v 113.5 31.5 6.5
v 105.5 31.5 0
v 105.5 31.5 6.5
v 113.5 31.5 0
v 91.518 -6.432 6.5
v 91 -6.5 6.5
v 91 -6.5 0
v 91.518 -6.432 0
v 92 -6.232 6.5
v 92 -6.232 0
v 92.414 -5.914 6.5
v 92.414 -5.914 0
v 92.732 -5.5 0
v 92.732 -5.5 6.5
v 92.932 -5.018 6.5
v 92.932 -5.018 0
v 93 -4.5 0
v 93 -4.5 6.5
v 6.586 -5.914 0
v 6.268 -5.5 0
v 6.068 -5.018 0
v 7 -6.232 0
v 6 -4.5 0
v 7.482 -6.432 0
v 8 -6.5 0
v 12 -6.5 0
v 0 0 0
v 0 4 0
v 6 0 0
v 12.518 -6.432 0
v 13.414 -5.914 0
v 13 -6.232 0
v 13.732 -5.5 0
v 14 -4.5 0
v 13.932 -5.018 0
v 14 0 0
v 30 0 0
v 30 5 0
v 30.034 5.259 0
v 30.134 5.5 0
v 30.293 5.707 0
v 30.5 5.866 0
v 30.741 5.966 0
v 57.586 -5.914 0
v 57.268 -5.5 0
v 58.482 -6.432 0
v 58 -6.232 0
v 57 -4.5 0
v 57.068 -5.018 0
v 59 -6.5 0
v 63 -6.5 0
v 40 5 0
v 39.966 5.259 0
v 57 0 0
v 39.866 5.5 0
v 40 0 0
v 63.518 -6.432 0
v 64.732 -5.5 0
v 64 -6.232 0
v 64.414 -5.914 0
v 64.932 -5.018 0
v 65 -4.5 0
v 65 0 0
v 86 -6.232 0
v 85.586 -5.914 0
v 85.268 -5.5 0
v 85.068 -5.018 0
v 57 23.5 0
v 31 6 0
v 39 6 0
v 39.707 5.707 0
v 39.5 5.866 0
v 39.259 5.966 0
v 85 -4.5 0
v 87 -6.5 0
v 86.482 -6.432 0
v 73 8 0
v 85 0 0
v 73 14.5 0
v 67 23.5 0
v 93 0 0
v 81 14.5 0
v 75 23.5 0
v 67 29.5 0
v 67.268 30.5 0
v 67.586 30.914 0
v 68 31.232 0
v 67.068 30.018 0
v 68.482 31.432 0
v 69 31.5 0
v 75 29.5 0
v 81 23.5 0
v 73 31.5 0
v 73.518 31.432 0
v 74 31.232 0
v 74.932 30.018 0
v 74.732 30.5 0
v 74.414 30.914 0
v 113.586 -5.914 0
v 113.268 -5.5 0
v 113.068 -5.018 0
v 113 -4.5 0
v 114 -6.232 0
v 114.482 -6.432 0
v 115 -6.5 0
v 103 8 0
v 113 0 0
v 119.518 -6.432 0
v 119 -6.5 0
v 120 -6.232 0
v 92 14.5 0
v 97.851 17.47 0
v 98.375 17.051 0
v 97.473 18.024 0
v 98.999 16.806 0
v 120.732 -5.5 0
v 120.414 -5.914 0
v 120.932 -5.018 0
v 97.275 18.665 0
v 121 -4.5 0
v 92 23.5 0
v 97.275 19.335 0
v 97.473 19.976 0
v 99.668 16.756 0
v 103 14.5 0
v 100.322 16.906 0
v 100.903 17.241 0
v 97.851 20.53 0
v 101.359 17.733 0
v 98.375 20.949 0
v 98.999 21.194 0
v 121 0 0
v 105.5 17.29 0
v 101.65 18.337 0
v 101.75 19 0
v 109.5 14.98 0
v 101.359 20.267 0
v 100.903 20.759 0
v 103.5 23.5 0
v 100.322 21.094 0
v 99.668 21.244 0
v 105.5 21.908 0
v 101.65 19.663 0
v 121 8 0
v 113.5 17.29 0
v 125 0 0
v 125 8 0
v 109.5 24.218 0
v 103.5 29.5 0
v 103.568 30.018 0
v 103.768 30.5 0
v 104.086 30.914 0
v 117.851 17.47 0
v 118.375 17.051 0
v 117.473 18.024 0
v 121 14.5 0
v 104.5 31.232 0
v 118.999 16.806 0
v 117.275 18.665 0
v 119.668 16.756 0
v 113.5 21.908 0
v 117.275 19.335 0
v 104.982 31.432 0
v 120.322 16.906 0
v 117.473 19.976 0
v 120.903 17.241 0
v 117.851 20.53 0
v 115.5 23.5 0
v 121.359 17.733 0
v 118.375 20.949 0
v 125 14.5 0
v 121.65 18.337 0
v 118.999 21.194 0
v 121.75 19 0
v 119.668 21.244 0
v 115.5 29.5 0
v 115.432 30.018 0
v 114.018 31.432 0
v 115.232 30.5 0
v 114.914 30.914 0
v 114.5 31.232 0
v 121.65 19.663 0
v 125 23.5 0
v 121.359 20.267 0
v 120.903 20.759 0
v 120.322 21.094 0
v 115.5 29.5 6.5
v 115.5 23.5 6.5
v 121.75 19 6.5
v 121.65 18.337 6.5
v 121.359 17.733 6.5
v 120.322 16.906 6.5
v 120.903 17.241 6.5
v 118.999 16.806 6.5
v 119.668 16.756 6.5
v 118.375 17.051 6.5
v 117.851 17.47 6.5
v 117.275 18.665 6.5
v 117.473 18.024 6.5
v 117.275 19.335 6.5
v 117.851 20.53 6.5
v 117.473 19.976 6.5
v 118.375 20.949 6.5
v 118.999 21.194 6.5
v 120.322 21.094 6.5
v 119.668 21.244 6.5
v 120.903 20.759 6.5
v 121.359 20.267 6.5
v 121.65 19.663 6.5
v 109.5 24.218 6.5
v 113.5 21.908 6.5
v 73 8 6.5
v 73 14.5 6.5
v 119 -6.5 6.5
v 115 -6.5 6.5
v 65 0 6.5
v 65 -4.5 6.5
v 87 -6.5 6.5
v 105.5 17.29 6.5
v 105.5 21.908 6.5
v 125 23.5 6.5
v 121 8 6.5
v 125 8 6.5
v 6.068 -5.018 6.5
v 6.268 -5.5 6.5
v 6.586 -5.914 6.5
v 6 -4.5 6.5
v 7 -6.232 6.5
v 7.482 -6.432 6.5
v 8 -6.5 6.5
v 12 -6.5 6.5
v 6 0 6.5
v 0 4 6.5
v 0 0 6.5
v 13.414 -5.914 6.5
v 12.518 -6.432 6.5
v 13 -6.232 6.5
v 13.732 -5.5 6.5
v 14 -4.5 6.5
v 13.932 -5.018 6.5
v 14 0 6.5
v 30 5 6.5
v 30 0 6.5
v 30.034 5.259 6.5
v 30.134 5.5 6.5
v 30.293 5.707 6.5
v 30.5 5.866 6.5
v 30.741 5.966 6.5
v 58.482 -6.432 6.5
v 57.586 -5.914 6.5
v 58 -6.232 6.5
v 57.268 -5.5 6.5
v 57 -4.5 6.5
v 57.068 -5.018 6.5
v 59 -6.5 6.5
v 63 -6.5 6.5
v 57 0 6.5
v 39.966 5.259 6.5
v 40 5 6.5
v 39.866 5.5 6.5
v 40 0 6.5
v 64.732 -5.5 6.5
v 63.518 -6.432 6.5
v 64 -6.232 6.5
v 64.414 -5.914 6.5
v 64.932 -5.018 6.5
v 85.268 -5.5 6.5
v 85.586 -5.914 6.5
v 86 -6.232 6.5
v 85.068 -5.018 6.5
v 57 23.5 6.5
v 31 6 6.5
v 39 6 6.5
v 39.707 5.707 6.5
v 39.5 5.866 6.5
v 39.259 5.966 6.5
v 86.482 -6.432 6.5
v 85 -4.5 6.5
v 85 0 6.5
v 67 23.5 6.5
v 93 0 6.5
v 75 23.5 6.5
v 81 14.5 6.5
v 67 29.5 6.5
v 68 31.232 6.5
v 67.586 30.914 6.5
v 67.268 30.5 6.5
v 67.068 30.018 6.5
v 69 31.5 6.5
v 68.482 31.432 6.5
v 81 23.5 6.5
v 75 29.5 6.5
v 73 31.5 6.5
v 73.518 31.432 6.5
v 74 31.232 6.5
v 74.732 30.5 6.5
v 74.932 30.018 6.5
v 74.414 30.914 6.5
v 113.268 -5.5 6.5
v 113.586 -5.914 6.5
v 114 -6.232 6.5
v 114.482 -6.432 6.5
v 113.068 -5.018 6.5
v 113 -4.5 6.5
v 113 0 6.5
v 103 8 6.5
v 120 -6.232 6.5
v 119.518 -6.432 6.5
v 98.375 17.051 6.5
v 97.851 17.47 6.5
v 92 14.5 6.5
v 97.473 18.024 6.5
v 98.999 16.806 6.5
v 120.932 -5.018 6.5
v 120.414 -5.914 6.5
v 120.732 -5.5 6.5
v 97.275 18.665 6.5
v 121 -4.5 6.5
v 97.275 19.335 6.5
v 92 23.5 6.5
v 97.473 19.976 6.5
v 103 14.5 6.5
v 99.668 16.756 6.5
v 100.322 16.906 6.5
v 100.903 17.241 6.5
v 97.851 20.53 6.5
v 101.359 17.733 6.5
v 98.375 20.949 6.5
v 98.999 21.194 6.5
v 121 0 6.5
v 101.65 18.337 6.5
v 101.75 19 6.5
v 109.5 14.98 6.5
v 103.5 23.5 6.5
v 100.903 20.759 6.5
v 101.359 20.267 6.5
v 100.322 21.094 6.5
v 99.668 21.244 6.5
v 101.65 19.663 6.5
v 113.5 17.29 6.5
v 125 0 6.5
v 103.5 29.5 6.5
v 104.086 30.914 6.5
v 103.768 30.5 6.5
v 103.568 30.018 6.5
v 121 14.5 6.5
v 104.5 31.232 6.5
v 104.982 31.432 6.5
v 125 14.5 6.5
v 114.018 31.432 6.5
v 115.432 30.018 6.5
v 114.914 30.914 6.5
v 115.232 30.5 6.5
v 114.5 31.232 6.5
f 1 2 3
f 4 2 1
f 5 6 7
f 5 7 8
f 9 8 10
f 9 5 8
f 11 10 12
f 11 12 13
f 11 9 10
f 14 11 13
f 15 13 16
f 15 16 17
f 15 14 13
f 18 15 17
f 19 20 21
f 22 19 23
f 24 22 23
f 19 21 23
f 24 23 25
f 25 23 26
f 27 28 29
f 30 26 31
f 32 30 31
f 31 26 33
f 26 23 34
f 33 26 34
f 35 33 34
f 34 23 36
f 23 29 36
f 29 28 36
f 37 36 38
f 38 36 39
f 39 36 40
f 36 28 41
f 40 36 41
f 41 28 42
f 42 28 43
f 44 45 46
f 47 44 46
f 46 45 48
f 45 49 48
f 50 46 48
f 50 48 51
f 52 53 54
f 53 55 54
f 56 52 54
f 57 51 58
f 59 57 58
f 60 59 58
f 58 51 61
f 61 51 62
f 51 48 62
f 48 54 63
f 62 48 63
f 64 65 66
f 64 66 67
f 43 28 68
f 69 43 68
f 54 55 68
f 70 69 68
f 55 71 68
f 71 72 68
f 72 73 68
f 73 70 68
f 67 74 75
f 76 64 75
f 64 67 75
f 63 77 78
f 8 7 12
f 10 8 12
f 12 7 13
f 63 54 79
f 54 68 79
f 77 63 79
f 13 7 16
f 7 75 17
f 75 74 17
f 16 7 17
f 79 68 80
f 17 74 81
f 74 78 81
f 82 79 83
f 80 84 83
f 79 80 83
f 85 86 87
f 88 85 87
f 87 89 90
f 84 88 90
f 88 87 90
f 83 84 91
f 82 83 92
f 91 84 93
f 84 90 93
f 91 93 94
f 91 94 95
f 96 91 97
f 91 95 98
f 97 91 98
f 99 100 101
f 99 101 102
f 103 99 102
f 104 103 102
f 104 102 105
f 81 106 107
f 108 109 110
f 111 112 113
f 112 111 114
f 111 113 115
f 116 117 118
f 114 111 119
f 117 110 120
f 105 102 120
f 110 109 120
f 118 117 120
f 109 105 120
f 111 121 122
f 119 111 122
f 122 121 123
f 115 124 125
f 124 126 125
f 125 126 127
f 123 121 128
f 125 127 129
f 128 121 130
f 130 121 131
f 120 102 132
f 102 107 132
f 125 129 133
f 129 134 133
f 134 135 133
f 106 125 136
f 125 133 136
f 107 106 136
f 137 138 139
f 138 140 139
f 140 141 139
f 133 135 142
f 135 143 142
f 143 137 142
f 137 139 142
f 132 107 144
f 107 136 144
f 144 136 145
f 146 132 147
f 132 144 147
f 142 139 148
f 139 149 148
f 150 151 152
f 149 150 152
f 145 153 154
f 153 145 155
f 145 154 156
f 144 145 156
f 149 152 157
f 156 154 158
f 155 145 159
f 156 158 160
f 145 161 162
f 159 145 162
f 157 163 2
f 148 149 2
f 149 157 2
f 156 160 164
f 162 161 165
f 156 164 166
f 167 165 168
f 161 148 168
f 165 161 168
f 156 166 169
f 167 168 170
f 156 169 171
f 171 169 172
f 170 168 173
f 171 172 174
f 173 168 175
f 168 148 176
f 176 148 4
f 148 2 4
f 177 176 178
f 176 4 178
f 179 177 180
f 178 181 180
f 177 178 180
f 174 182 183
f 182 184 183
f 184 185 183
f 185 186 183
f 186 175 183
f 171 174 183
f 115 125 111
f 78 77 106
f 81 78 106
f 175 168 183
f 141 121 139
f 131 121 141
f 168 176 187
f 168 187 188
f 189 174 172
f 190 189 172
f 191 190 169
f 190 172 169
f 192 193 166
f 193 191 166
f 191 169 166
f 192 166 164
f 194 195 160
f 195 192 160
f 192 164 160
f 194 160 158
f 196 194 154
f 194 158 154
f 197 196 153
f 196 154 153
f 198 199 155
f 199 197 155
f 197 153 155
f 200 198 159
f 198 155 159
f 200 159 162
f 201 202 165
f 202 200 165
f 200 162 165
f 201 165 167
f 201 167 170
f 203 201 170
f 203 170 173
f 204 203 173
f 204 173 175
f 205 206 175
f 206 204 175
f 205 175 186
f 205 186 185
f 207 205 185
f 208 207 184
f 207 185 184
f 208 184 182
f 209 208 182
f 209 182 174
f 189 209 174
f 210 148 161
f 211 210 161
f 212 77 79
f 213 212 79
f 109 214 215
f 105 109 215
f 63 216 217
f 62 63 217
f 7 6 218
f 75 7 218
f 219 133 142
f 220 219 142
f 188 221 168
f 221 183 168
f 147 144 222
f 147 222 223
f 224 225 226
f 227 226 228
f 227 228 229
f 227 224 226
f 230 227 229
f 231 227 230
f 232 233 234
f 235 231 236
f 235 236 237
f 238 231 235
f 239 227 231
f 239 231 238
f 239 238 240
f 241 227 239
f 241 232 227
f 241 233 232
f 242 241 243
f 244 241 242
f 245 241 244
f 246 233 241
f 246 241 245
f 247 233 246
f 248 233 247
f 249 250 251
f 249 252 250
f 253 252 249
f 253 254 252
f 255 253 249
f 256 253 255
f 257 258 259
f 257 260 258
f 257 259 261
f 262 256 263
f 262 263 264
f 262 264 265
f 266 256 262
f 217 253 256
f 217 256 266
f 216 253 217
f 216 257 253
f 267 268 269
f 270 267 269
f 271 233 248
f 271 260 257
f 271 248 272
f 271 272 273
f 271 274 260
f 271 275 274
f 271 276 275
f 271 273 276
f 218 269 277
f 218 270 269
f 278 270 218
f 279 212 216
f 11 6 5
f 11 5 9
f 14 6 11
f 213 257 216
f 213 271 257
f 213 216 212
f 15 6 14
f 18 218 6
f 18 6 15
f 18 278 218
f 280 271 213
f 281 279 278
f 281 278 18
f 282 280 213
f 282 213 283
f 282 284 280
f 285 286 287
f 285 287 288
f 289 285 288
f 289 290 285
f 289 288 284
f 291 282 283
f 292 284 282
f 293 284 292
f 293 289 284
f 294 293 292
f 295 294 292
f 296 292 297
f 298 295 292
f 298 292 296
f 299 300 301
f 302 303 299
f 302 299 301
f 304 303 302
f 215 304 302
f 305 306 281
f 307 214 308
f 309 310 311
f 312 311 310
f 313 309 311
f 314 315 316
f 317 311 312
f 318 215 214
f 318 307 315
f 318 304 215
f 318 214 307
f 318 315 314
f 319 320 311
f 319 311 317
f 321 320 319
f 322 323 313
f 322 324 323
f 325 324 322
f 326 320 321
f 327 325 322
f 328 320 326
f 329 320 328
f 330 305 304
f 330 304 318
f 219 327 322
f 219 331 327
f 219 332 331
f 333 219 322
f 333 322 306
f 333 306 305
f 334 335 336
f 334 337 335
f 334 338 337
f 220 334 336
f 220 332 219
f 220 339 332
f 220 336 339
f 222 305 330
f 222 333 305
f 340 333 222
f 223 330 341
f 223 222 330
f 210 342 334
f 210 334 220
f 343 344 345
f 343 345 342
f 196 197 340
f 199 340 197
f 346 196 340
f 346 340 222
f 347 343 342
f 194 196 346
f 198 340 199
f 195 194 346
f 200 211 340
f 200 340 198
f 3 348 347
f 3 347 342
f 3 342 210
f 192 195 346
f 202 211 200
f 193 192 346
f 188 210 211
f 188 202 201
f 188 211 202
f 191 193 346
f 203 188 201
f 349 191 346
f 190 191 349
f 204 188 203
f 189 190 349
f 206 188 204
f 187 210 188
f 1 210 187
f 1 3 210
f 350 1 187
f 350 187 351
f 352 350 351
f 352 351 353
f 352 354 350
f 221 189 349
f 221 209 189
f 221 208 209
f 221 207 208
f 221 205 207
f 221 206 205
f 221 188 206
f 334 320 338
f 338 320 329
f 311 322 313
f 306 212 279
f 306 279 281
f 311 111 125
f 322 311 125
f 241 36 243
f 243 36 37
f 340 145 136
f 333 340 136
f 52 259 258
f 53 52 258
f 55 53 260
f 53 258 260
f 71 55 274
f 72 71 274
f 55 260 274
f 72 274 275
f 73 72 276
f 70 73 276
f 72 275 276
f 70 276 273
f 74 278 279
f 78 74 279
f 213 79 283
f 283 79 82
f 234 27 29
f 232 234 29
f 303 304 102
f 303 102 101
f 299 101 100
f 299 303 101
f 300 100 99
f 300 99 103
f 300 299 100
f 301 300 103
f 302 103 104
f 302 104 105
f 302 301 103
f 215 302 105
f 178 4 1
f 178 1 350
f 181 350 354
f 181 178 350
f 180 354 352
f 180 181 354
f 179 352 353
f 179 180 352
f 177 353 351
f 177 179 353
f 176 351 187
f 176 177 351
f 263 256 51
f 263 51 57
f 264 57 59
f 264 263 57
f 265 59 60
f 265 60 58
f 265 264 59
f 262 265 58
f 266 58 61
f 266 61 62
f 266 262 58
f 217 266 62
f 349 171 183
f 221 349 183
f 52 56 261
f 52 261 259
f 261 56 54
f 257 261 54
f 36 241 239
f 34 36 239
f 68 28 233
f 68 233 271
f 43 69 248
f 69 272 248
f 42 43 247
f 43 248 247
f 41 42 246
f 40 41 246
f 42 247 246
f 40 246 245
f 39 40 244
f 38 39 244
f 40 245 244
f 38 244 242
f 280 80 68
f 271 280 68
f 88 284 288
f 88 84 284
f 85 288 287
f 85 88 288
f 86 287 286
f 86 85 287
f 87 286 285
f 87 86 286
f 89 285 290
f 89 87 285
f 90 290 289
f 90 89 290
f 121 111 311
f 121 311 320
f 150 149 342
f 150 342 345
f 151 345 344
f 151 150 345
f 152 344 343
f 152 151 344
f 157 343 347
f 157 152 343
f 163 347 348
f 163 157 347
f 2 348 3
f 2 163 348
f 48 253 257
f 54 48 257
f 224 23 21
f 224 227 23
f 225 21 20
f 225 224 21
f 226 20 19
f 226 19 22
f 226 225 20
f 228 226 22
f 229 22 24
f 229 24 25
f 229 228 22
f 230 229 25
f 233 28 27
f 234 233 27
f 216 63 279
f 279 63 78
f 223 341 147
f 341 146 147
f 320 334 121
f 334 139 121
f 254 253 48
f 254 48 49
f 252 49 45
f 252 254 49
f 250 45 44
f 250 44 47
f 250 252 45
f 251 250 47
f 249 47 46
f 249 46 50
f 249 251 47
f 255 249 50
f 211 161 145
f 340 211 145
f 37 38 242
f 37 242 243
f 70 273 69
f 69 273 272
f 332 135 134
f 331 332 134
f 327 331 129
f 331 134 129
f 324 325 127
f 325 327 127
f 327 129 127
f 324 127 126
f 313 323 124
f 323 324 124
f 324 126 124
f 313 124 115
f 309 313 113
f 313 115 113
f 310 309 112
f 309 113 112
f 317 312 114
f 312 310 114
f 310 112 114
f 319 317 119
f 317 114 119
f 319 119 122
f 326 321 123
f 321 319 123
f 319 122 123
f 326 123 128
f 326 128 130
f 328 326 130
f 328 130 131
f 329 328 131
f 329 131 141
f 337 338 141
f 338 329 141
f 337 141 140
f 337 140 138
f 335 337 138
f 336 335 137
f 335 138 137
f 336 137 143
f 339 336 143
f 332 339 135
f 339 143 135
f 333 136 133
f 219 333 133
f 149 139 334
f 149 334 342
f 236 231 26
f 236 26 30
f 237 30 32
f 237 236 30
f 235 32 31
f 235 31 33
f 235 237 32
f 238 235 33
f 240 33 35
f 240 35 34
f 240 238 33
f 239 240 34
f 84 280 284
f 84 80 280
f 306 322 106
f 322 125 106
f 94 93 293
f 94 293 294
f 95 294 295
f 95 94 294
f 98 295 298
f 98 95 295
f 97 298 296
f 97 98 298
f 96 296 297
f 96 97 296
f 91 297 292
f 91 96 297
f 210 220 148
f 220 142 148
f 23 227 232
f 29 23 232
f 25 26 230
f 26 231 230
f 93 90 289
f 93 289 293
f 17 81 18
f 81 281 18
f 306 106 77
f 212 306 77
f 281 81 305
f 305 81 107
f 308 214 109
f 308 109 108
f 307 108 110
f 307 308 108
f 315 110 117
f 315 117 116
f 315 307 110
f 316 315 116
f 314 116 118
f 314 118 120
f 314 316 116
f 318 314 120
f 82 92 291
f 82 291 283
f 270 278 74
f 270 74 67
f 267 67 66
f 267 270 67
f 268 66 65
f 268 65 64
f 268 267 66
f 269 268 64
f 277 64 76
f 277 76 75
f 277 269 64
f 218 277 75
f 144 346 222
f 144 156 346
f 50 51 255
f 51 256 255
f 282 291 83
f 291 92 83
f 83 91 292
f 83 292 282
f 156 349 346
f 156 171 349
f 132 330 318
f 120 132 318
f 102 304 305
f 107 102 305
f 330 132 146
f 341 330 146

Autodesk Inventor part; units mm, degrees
ref_plane "YZ Plane" through (0, 0, 0) normal (1, 0, 0) x (0, 1, 0)
ref_plane "XZ Plane" through (0, 0, 0) normal (0, 1, 0) x (-1, 0, 0)
ref_plane "XY Plane" through (0, 0, 0) normal (0, 0, 1) x (1, 0, 0)
sketch "Sketch1" plane through (0, 0, 0) normal (0, 0, 1) x (1, 0, 0)
  line L0 (0, 4) -> (0, 0)
  line L1 (0, 0) -> (125, 0)
  line L2 (0, 4) -> (57, 23.5)
  line L3 (103, 14.5) -> (103, 8)
  line L4 (103, 8) -> (73, 8)
  line L5 (73, 8) -> (73, 14.5)
  line L6 (125, 14.5) -> (121, 14.5)
  line L7 (121, 14.5) -> (121, 8)
  line L8 (121, 8) -> (125, 8)
  line L9 (125, 0) -> (125, 8)
  line L10 (125, 14.5) -> (125, 23.5)
  line L11 (81, 23.5) -> (81, 14.5)
  line L12 (92, 14.5) -> (92, 23.5)
  line L13 (73, 14.5) -> (81, 14.5)
  line L14 (92, 14.5) -> (103, 14.5)
  line L15 (81, 14.5) -> (92, 14.5) construction
  circle A0 centre (86.5, 19.599) radius 7.5 construction
  circle A1 centre (86.5, 19.599) radius 4 construction
  line L16 (113.5, 21.9084) -> (113.5, 17.2896)
  line L17 (113.5, 17.2896) -> (109.5, 14.9802)
  line L18 (109.5, 14.9802) -> (105.5, 17.2896)
  line L19 (105.5, 17.2896) -> (105.5, 21.9084)
  line L20 (105.5, 21.9084) -> (109.5, 24.2178)
  line L21 (109.5, 24.2178) -> (113.5, 21.9084)
  circle A2 centre (109.5, 19.599) radius 2.5 construction
  line L22 (103.5, 23.5) -> (103.5, 29.5)
  line L23 (105.5, 31.5) -> (113.5, 31.5)
  line L24 (115.5, 29.5) -> (115.5, 23.5)
  arc A3 (105.5, 31.5) -> (103.5, 29.5) centre (105.5, 29.5) ccw
  arc A4 (115.5, 29.5) -> (113.5, 31.5) centre (113.5, 29.5) ccw
  line L25 (125, 23.5) -> (115.5, 23.5)
  line L26 (103.5, 23.5) -> (92, 23.5)
  circle A5 centre (99.5, 19) radius 4.5 construction
  circle A6 centre (119.5, 19) radius 4.5 construction
  circle A7 centre (99.5, 19) radius 2.25
  circle A8 centre (119.5, 19) radius 2.25
  line L27 (67, 23.5) -> (67, 29.5)
  line L28 (69, 31.5) -> (73, 31.5)
  line L29 (75, 29.5) -> (75, 23.5)
  arc A9 (69, 31.5) -> (67, 29.5) centre (69, 29.5) ccw
  arc A10 (75, 29.5) -> (73, 31.5) centre (73, 29.5) ccw
  line L30 (81, 23.5) -> (75, 23.5)
  line L31 (67, 23.5) -> (57, 23.5)
  point P0 (81, 14.5)
  point P1 (92, 14.5)
  point P2 (86.5, 14.5)
  point P3 (125, 19)
  point P4 (109.5, 31.5)
  dimension "d0" = 8
  dimension "d2" = 6.5
  dimension "d3" = 4
  dimension "d4" = 15
  dimension "d5" = 8
  dimension "d6" = 9
  dimension "d7" = 11
  dimension "d8" = 11
  dimension "d9" = 8
  dimension "d10" = 5
  dimension "d11" = 2
  dimension "d12" = 12
  dimension "d13" = 9
  dimension "d14" = 9
  dimension "d15" = 10
  dimension "d16" = 10
  dimension "d17" = 4.5
  dimension "d18" = 4.5
  dimension "d19" = 13
  dimension "d20" = 5.5
  dimension "d21" = 18
  dimension "d22" = 2
  dimension "d23" = 8
  dimension "d24" = 6
  dimension "d25" = 10
  dimension "d27" = 30
  dimension "d28" = 4
  dimension "d30" = 8
  dimension "d31" = 125
extrude "Extrusion1" add sketch "Sketch1" along normal blind 6.5
sketch "Sketch2" plane through (0, 0, 6.5) normal (0, 0, 1) x (1, 0, 0)
  line L0 (0, 4) -> (0, 0) projected
  line L1 (0, 0) -> (125, 0) projected
  line L2 (6, 0) -> (14, 0)
  line L3 (14, 0) -> (14, -4.5)
  line L4 (12, -6.5) -> (8, -6.5)
  line L5 (6, -4.5) -> (6, 0)
  line L6 (57, 0) -> (65, 0)
  line L7 (65, 0) -> (65, -4.5)
  line L8 (63, -6.5) -> (59, -6.5)
  line L9 (57, -4.5) -> (57, 0)
  line L10 (85, 0) -> (93, 0)
  line L11 (93, 0) -> (93, -4.5)
  line L12 (91, -6.5) -> (87, -6.5)
  line L13 (85, -4.5) -> (85, 0)
  line L14 (113, 0) -> (121, 0)
  line L15 (121, 0) -> (121, -4.5)
  line L16 (119, -6.5) -> (115, -6.5)
  line L17 (113, -4.5) -> (113, 0)
  arc A0 (6, -4.5) -> (8, -6.5) centre (8, -4.5) ccw
  arc A1 (12, -6.5) -> (14, -4.5) centre (12, -4.5) ccw
  arc A2 (57, -4.5) -> (59, -6.5) centre (59, -4.5) ccw
  arc A3 (63, -6.5) -> (65, -4.5) centre (63, -4.5) ccw
  arc A4 (85, -4.5) -> (87, -6.5) centre (87, -4.5) ccw
  arc A5 (91, -6.5) -> (93, -4.5) centre (91, -4.5) ccw
  arc A6 (113, -4.5) -> (115, -6.5) centre (115, -4.5) ccw
  arc A7 (119, -6.5) -> (121, -4.5) centre (119, -4.5) ccw
  dimension "d34" = 2
  dimension "d35" = 8
  dimension "d36" = 8
  dimension "d37" = 8
  dimension "d38" = 8
  dimension "d39" = 6.5
  dimension "d40" = 6
  dimension "d41" = 43
  dimension "d42" = 20
  dimension "d43" = 20
extrude "Extrusion2" add sketch "Sketch2" against normal blind 6.5
sketch "Sketch3" plane through (0, 0, 6.5) normal (0, 0, 1) x (1, 0, 0)
  line L0 (0, 4) -> (0, 0) projected
  line L1 (14, 0) -> (57, 0) projected
  line L2 (30, 0) -> (40, 0)
  line L3 (40, 0) -> (40, 5)
  line L4 (39, 6) -> (31, 6)
  line L5 (30, 5) -> (30, 0)
  arc A0 (31, 6) -> (30, 5) centre (31, 5) ccw
  arc A1 (40, 5) -> (39, 6) centre (39, 5) ccw
  point P0 (35, 6)
  dimension "d46" = 1
  dimension "d47" = 10
  dimension "d48" = 6
  dimension "d49" = 35
extrude "Extrusion3" cut sketch "Sketch3" against normal through all
properties part number "x_motor_wall_lower" material "Plywood, Finish"
